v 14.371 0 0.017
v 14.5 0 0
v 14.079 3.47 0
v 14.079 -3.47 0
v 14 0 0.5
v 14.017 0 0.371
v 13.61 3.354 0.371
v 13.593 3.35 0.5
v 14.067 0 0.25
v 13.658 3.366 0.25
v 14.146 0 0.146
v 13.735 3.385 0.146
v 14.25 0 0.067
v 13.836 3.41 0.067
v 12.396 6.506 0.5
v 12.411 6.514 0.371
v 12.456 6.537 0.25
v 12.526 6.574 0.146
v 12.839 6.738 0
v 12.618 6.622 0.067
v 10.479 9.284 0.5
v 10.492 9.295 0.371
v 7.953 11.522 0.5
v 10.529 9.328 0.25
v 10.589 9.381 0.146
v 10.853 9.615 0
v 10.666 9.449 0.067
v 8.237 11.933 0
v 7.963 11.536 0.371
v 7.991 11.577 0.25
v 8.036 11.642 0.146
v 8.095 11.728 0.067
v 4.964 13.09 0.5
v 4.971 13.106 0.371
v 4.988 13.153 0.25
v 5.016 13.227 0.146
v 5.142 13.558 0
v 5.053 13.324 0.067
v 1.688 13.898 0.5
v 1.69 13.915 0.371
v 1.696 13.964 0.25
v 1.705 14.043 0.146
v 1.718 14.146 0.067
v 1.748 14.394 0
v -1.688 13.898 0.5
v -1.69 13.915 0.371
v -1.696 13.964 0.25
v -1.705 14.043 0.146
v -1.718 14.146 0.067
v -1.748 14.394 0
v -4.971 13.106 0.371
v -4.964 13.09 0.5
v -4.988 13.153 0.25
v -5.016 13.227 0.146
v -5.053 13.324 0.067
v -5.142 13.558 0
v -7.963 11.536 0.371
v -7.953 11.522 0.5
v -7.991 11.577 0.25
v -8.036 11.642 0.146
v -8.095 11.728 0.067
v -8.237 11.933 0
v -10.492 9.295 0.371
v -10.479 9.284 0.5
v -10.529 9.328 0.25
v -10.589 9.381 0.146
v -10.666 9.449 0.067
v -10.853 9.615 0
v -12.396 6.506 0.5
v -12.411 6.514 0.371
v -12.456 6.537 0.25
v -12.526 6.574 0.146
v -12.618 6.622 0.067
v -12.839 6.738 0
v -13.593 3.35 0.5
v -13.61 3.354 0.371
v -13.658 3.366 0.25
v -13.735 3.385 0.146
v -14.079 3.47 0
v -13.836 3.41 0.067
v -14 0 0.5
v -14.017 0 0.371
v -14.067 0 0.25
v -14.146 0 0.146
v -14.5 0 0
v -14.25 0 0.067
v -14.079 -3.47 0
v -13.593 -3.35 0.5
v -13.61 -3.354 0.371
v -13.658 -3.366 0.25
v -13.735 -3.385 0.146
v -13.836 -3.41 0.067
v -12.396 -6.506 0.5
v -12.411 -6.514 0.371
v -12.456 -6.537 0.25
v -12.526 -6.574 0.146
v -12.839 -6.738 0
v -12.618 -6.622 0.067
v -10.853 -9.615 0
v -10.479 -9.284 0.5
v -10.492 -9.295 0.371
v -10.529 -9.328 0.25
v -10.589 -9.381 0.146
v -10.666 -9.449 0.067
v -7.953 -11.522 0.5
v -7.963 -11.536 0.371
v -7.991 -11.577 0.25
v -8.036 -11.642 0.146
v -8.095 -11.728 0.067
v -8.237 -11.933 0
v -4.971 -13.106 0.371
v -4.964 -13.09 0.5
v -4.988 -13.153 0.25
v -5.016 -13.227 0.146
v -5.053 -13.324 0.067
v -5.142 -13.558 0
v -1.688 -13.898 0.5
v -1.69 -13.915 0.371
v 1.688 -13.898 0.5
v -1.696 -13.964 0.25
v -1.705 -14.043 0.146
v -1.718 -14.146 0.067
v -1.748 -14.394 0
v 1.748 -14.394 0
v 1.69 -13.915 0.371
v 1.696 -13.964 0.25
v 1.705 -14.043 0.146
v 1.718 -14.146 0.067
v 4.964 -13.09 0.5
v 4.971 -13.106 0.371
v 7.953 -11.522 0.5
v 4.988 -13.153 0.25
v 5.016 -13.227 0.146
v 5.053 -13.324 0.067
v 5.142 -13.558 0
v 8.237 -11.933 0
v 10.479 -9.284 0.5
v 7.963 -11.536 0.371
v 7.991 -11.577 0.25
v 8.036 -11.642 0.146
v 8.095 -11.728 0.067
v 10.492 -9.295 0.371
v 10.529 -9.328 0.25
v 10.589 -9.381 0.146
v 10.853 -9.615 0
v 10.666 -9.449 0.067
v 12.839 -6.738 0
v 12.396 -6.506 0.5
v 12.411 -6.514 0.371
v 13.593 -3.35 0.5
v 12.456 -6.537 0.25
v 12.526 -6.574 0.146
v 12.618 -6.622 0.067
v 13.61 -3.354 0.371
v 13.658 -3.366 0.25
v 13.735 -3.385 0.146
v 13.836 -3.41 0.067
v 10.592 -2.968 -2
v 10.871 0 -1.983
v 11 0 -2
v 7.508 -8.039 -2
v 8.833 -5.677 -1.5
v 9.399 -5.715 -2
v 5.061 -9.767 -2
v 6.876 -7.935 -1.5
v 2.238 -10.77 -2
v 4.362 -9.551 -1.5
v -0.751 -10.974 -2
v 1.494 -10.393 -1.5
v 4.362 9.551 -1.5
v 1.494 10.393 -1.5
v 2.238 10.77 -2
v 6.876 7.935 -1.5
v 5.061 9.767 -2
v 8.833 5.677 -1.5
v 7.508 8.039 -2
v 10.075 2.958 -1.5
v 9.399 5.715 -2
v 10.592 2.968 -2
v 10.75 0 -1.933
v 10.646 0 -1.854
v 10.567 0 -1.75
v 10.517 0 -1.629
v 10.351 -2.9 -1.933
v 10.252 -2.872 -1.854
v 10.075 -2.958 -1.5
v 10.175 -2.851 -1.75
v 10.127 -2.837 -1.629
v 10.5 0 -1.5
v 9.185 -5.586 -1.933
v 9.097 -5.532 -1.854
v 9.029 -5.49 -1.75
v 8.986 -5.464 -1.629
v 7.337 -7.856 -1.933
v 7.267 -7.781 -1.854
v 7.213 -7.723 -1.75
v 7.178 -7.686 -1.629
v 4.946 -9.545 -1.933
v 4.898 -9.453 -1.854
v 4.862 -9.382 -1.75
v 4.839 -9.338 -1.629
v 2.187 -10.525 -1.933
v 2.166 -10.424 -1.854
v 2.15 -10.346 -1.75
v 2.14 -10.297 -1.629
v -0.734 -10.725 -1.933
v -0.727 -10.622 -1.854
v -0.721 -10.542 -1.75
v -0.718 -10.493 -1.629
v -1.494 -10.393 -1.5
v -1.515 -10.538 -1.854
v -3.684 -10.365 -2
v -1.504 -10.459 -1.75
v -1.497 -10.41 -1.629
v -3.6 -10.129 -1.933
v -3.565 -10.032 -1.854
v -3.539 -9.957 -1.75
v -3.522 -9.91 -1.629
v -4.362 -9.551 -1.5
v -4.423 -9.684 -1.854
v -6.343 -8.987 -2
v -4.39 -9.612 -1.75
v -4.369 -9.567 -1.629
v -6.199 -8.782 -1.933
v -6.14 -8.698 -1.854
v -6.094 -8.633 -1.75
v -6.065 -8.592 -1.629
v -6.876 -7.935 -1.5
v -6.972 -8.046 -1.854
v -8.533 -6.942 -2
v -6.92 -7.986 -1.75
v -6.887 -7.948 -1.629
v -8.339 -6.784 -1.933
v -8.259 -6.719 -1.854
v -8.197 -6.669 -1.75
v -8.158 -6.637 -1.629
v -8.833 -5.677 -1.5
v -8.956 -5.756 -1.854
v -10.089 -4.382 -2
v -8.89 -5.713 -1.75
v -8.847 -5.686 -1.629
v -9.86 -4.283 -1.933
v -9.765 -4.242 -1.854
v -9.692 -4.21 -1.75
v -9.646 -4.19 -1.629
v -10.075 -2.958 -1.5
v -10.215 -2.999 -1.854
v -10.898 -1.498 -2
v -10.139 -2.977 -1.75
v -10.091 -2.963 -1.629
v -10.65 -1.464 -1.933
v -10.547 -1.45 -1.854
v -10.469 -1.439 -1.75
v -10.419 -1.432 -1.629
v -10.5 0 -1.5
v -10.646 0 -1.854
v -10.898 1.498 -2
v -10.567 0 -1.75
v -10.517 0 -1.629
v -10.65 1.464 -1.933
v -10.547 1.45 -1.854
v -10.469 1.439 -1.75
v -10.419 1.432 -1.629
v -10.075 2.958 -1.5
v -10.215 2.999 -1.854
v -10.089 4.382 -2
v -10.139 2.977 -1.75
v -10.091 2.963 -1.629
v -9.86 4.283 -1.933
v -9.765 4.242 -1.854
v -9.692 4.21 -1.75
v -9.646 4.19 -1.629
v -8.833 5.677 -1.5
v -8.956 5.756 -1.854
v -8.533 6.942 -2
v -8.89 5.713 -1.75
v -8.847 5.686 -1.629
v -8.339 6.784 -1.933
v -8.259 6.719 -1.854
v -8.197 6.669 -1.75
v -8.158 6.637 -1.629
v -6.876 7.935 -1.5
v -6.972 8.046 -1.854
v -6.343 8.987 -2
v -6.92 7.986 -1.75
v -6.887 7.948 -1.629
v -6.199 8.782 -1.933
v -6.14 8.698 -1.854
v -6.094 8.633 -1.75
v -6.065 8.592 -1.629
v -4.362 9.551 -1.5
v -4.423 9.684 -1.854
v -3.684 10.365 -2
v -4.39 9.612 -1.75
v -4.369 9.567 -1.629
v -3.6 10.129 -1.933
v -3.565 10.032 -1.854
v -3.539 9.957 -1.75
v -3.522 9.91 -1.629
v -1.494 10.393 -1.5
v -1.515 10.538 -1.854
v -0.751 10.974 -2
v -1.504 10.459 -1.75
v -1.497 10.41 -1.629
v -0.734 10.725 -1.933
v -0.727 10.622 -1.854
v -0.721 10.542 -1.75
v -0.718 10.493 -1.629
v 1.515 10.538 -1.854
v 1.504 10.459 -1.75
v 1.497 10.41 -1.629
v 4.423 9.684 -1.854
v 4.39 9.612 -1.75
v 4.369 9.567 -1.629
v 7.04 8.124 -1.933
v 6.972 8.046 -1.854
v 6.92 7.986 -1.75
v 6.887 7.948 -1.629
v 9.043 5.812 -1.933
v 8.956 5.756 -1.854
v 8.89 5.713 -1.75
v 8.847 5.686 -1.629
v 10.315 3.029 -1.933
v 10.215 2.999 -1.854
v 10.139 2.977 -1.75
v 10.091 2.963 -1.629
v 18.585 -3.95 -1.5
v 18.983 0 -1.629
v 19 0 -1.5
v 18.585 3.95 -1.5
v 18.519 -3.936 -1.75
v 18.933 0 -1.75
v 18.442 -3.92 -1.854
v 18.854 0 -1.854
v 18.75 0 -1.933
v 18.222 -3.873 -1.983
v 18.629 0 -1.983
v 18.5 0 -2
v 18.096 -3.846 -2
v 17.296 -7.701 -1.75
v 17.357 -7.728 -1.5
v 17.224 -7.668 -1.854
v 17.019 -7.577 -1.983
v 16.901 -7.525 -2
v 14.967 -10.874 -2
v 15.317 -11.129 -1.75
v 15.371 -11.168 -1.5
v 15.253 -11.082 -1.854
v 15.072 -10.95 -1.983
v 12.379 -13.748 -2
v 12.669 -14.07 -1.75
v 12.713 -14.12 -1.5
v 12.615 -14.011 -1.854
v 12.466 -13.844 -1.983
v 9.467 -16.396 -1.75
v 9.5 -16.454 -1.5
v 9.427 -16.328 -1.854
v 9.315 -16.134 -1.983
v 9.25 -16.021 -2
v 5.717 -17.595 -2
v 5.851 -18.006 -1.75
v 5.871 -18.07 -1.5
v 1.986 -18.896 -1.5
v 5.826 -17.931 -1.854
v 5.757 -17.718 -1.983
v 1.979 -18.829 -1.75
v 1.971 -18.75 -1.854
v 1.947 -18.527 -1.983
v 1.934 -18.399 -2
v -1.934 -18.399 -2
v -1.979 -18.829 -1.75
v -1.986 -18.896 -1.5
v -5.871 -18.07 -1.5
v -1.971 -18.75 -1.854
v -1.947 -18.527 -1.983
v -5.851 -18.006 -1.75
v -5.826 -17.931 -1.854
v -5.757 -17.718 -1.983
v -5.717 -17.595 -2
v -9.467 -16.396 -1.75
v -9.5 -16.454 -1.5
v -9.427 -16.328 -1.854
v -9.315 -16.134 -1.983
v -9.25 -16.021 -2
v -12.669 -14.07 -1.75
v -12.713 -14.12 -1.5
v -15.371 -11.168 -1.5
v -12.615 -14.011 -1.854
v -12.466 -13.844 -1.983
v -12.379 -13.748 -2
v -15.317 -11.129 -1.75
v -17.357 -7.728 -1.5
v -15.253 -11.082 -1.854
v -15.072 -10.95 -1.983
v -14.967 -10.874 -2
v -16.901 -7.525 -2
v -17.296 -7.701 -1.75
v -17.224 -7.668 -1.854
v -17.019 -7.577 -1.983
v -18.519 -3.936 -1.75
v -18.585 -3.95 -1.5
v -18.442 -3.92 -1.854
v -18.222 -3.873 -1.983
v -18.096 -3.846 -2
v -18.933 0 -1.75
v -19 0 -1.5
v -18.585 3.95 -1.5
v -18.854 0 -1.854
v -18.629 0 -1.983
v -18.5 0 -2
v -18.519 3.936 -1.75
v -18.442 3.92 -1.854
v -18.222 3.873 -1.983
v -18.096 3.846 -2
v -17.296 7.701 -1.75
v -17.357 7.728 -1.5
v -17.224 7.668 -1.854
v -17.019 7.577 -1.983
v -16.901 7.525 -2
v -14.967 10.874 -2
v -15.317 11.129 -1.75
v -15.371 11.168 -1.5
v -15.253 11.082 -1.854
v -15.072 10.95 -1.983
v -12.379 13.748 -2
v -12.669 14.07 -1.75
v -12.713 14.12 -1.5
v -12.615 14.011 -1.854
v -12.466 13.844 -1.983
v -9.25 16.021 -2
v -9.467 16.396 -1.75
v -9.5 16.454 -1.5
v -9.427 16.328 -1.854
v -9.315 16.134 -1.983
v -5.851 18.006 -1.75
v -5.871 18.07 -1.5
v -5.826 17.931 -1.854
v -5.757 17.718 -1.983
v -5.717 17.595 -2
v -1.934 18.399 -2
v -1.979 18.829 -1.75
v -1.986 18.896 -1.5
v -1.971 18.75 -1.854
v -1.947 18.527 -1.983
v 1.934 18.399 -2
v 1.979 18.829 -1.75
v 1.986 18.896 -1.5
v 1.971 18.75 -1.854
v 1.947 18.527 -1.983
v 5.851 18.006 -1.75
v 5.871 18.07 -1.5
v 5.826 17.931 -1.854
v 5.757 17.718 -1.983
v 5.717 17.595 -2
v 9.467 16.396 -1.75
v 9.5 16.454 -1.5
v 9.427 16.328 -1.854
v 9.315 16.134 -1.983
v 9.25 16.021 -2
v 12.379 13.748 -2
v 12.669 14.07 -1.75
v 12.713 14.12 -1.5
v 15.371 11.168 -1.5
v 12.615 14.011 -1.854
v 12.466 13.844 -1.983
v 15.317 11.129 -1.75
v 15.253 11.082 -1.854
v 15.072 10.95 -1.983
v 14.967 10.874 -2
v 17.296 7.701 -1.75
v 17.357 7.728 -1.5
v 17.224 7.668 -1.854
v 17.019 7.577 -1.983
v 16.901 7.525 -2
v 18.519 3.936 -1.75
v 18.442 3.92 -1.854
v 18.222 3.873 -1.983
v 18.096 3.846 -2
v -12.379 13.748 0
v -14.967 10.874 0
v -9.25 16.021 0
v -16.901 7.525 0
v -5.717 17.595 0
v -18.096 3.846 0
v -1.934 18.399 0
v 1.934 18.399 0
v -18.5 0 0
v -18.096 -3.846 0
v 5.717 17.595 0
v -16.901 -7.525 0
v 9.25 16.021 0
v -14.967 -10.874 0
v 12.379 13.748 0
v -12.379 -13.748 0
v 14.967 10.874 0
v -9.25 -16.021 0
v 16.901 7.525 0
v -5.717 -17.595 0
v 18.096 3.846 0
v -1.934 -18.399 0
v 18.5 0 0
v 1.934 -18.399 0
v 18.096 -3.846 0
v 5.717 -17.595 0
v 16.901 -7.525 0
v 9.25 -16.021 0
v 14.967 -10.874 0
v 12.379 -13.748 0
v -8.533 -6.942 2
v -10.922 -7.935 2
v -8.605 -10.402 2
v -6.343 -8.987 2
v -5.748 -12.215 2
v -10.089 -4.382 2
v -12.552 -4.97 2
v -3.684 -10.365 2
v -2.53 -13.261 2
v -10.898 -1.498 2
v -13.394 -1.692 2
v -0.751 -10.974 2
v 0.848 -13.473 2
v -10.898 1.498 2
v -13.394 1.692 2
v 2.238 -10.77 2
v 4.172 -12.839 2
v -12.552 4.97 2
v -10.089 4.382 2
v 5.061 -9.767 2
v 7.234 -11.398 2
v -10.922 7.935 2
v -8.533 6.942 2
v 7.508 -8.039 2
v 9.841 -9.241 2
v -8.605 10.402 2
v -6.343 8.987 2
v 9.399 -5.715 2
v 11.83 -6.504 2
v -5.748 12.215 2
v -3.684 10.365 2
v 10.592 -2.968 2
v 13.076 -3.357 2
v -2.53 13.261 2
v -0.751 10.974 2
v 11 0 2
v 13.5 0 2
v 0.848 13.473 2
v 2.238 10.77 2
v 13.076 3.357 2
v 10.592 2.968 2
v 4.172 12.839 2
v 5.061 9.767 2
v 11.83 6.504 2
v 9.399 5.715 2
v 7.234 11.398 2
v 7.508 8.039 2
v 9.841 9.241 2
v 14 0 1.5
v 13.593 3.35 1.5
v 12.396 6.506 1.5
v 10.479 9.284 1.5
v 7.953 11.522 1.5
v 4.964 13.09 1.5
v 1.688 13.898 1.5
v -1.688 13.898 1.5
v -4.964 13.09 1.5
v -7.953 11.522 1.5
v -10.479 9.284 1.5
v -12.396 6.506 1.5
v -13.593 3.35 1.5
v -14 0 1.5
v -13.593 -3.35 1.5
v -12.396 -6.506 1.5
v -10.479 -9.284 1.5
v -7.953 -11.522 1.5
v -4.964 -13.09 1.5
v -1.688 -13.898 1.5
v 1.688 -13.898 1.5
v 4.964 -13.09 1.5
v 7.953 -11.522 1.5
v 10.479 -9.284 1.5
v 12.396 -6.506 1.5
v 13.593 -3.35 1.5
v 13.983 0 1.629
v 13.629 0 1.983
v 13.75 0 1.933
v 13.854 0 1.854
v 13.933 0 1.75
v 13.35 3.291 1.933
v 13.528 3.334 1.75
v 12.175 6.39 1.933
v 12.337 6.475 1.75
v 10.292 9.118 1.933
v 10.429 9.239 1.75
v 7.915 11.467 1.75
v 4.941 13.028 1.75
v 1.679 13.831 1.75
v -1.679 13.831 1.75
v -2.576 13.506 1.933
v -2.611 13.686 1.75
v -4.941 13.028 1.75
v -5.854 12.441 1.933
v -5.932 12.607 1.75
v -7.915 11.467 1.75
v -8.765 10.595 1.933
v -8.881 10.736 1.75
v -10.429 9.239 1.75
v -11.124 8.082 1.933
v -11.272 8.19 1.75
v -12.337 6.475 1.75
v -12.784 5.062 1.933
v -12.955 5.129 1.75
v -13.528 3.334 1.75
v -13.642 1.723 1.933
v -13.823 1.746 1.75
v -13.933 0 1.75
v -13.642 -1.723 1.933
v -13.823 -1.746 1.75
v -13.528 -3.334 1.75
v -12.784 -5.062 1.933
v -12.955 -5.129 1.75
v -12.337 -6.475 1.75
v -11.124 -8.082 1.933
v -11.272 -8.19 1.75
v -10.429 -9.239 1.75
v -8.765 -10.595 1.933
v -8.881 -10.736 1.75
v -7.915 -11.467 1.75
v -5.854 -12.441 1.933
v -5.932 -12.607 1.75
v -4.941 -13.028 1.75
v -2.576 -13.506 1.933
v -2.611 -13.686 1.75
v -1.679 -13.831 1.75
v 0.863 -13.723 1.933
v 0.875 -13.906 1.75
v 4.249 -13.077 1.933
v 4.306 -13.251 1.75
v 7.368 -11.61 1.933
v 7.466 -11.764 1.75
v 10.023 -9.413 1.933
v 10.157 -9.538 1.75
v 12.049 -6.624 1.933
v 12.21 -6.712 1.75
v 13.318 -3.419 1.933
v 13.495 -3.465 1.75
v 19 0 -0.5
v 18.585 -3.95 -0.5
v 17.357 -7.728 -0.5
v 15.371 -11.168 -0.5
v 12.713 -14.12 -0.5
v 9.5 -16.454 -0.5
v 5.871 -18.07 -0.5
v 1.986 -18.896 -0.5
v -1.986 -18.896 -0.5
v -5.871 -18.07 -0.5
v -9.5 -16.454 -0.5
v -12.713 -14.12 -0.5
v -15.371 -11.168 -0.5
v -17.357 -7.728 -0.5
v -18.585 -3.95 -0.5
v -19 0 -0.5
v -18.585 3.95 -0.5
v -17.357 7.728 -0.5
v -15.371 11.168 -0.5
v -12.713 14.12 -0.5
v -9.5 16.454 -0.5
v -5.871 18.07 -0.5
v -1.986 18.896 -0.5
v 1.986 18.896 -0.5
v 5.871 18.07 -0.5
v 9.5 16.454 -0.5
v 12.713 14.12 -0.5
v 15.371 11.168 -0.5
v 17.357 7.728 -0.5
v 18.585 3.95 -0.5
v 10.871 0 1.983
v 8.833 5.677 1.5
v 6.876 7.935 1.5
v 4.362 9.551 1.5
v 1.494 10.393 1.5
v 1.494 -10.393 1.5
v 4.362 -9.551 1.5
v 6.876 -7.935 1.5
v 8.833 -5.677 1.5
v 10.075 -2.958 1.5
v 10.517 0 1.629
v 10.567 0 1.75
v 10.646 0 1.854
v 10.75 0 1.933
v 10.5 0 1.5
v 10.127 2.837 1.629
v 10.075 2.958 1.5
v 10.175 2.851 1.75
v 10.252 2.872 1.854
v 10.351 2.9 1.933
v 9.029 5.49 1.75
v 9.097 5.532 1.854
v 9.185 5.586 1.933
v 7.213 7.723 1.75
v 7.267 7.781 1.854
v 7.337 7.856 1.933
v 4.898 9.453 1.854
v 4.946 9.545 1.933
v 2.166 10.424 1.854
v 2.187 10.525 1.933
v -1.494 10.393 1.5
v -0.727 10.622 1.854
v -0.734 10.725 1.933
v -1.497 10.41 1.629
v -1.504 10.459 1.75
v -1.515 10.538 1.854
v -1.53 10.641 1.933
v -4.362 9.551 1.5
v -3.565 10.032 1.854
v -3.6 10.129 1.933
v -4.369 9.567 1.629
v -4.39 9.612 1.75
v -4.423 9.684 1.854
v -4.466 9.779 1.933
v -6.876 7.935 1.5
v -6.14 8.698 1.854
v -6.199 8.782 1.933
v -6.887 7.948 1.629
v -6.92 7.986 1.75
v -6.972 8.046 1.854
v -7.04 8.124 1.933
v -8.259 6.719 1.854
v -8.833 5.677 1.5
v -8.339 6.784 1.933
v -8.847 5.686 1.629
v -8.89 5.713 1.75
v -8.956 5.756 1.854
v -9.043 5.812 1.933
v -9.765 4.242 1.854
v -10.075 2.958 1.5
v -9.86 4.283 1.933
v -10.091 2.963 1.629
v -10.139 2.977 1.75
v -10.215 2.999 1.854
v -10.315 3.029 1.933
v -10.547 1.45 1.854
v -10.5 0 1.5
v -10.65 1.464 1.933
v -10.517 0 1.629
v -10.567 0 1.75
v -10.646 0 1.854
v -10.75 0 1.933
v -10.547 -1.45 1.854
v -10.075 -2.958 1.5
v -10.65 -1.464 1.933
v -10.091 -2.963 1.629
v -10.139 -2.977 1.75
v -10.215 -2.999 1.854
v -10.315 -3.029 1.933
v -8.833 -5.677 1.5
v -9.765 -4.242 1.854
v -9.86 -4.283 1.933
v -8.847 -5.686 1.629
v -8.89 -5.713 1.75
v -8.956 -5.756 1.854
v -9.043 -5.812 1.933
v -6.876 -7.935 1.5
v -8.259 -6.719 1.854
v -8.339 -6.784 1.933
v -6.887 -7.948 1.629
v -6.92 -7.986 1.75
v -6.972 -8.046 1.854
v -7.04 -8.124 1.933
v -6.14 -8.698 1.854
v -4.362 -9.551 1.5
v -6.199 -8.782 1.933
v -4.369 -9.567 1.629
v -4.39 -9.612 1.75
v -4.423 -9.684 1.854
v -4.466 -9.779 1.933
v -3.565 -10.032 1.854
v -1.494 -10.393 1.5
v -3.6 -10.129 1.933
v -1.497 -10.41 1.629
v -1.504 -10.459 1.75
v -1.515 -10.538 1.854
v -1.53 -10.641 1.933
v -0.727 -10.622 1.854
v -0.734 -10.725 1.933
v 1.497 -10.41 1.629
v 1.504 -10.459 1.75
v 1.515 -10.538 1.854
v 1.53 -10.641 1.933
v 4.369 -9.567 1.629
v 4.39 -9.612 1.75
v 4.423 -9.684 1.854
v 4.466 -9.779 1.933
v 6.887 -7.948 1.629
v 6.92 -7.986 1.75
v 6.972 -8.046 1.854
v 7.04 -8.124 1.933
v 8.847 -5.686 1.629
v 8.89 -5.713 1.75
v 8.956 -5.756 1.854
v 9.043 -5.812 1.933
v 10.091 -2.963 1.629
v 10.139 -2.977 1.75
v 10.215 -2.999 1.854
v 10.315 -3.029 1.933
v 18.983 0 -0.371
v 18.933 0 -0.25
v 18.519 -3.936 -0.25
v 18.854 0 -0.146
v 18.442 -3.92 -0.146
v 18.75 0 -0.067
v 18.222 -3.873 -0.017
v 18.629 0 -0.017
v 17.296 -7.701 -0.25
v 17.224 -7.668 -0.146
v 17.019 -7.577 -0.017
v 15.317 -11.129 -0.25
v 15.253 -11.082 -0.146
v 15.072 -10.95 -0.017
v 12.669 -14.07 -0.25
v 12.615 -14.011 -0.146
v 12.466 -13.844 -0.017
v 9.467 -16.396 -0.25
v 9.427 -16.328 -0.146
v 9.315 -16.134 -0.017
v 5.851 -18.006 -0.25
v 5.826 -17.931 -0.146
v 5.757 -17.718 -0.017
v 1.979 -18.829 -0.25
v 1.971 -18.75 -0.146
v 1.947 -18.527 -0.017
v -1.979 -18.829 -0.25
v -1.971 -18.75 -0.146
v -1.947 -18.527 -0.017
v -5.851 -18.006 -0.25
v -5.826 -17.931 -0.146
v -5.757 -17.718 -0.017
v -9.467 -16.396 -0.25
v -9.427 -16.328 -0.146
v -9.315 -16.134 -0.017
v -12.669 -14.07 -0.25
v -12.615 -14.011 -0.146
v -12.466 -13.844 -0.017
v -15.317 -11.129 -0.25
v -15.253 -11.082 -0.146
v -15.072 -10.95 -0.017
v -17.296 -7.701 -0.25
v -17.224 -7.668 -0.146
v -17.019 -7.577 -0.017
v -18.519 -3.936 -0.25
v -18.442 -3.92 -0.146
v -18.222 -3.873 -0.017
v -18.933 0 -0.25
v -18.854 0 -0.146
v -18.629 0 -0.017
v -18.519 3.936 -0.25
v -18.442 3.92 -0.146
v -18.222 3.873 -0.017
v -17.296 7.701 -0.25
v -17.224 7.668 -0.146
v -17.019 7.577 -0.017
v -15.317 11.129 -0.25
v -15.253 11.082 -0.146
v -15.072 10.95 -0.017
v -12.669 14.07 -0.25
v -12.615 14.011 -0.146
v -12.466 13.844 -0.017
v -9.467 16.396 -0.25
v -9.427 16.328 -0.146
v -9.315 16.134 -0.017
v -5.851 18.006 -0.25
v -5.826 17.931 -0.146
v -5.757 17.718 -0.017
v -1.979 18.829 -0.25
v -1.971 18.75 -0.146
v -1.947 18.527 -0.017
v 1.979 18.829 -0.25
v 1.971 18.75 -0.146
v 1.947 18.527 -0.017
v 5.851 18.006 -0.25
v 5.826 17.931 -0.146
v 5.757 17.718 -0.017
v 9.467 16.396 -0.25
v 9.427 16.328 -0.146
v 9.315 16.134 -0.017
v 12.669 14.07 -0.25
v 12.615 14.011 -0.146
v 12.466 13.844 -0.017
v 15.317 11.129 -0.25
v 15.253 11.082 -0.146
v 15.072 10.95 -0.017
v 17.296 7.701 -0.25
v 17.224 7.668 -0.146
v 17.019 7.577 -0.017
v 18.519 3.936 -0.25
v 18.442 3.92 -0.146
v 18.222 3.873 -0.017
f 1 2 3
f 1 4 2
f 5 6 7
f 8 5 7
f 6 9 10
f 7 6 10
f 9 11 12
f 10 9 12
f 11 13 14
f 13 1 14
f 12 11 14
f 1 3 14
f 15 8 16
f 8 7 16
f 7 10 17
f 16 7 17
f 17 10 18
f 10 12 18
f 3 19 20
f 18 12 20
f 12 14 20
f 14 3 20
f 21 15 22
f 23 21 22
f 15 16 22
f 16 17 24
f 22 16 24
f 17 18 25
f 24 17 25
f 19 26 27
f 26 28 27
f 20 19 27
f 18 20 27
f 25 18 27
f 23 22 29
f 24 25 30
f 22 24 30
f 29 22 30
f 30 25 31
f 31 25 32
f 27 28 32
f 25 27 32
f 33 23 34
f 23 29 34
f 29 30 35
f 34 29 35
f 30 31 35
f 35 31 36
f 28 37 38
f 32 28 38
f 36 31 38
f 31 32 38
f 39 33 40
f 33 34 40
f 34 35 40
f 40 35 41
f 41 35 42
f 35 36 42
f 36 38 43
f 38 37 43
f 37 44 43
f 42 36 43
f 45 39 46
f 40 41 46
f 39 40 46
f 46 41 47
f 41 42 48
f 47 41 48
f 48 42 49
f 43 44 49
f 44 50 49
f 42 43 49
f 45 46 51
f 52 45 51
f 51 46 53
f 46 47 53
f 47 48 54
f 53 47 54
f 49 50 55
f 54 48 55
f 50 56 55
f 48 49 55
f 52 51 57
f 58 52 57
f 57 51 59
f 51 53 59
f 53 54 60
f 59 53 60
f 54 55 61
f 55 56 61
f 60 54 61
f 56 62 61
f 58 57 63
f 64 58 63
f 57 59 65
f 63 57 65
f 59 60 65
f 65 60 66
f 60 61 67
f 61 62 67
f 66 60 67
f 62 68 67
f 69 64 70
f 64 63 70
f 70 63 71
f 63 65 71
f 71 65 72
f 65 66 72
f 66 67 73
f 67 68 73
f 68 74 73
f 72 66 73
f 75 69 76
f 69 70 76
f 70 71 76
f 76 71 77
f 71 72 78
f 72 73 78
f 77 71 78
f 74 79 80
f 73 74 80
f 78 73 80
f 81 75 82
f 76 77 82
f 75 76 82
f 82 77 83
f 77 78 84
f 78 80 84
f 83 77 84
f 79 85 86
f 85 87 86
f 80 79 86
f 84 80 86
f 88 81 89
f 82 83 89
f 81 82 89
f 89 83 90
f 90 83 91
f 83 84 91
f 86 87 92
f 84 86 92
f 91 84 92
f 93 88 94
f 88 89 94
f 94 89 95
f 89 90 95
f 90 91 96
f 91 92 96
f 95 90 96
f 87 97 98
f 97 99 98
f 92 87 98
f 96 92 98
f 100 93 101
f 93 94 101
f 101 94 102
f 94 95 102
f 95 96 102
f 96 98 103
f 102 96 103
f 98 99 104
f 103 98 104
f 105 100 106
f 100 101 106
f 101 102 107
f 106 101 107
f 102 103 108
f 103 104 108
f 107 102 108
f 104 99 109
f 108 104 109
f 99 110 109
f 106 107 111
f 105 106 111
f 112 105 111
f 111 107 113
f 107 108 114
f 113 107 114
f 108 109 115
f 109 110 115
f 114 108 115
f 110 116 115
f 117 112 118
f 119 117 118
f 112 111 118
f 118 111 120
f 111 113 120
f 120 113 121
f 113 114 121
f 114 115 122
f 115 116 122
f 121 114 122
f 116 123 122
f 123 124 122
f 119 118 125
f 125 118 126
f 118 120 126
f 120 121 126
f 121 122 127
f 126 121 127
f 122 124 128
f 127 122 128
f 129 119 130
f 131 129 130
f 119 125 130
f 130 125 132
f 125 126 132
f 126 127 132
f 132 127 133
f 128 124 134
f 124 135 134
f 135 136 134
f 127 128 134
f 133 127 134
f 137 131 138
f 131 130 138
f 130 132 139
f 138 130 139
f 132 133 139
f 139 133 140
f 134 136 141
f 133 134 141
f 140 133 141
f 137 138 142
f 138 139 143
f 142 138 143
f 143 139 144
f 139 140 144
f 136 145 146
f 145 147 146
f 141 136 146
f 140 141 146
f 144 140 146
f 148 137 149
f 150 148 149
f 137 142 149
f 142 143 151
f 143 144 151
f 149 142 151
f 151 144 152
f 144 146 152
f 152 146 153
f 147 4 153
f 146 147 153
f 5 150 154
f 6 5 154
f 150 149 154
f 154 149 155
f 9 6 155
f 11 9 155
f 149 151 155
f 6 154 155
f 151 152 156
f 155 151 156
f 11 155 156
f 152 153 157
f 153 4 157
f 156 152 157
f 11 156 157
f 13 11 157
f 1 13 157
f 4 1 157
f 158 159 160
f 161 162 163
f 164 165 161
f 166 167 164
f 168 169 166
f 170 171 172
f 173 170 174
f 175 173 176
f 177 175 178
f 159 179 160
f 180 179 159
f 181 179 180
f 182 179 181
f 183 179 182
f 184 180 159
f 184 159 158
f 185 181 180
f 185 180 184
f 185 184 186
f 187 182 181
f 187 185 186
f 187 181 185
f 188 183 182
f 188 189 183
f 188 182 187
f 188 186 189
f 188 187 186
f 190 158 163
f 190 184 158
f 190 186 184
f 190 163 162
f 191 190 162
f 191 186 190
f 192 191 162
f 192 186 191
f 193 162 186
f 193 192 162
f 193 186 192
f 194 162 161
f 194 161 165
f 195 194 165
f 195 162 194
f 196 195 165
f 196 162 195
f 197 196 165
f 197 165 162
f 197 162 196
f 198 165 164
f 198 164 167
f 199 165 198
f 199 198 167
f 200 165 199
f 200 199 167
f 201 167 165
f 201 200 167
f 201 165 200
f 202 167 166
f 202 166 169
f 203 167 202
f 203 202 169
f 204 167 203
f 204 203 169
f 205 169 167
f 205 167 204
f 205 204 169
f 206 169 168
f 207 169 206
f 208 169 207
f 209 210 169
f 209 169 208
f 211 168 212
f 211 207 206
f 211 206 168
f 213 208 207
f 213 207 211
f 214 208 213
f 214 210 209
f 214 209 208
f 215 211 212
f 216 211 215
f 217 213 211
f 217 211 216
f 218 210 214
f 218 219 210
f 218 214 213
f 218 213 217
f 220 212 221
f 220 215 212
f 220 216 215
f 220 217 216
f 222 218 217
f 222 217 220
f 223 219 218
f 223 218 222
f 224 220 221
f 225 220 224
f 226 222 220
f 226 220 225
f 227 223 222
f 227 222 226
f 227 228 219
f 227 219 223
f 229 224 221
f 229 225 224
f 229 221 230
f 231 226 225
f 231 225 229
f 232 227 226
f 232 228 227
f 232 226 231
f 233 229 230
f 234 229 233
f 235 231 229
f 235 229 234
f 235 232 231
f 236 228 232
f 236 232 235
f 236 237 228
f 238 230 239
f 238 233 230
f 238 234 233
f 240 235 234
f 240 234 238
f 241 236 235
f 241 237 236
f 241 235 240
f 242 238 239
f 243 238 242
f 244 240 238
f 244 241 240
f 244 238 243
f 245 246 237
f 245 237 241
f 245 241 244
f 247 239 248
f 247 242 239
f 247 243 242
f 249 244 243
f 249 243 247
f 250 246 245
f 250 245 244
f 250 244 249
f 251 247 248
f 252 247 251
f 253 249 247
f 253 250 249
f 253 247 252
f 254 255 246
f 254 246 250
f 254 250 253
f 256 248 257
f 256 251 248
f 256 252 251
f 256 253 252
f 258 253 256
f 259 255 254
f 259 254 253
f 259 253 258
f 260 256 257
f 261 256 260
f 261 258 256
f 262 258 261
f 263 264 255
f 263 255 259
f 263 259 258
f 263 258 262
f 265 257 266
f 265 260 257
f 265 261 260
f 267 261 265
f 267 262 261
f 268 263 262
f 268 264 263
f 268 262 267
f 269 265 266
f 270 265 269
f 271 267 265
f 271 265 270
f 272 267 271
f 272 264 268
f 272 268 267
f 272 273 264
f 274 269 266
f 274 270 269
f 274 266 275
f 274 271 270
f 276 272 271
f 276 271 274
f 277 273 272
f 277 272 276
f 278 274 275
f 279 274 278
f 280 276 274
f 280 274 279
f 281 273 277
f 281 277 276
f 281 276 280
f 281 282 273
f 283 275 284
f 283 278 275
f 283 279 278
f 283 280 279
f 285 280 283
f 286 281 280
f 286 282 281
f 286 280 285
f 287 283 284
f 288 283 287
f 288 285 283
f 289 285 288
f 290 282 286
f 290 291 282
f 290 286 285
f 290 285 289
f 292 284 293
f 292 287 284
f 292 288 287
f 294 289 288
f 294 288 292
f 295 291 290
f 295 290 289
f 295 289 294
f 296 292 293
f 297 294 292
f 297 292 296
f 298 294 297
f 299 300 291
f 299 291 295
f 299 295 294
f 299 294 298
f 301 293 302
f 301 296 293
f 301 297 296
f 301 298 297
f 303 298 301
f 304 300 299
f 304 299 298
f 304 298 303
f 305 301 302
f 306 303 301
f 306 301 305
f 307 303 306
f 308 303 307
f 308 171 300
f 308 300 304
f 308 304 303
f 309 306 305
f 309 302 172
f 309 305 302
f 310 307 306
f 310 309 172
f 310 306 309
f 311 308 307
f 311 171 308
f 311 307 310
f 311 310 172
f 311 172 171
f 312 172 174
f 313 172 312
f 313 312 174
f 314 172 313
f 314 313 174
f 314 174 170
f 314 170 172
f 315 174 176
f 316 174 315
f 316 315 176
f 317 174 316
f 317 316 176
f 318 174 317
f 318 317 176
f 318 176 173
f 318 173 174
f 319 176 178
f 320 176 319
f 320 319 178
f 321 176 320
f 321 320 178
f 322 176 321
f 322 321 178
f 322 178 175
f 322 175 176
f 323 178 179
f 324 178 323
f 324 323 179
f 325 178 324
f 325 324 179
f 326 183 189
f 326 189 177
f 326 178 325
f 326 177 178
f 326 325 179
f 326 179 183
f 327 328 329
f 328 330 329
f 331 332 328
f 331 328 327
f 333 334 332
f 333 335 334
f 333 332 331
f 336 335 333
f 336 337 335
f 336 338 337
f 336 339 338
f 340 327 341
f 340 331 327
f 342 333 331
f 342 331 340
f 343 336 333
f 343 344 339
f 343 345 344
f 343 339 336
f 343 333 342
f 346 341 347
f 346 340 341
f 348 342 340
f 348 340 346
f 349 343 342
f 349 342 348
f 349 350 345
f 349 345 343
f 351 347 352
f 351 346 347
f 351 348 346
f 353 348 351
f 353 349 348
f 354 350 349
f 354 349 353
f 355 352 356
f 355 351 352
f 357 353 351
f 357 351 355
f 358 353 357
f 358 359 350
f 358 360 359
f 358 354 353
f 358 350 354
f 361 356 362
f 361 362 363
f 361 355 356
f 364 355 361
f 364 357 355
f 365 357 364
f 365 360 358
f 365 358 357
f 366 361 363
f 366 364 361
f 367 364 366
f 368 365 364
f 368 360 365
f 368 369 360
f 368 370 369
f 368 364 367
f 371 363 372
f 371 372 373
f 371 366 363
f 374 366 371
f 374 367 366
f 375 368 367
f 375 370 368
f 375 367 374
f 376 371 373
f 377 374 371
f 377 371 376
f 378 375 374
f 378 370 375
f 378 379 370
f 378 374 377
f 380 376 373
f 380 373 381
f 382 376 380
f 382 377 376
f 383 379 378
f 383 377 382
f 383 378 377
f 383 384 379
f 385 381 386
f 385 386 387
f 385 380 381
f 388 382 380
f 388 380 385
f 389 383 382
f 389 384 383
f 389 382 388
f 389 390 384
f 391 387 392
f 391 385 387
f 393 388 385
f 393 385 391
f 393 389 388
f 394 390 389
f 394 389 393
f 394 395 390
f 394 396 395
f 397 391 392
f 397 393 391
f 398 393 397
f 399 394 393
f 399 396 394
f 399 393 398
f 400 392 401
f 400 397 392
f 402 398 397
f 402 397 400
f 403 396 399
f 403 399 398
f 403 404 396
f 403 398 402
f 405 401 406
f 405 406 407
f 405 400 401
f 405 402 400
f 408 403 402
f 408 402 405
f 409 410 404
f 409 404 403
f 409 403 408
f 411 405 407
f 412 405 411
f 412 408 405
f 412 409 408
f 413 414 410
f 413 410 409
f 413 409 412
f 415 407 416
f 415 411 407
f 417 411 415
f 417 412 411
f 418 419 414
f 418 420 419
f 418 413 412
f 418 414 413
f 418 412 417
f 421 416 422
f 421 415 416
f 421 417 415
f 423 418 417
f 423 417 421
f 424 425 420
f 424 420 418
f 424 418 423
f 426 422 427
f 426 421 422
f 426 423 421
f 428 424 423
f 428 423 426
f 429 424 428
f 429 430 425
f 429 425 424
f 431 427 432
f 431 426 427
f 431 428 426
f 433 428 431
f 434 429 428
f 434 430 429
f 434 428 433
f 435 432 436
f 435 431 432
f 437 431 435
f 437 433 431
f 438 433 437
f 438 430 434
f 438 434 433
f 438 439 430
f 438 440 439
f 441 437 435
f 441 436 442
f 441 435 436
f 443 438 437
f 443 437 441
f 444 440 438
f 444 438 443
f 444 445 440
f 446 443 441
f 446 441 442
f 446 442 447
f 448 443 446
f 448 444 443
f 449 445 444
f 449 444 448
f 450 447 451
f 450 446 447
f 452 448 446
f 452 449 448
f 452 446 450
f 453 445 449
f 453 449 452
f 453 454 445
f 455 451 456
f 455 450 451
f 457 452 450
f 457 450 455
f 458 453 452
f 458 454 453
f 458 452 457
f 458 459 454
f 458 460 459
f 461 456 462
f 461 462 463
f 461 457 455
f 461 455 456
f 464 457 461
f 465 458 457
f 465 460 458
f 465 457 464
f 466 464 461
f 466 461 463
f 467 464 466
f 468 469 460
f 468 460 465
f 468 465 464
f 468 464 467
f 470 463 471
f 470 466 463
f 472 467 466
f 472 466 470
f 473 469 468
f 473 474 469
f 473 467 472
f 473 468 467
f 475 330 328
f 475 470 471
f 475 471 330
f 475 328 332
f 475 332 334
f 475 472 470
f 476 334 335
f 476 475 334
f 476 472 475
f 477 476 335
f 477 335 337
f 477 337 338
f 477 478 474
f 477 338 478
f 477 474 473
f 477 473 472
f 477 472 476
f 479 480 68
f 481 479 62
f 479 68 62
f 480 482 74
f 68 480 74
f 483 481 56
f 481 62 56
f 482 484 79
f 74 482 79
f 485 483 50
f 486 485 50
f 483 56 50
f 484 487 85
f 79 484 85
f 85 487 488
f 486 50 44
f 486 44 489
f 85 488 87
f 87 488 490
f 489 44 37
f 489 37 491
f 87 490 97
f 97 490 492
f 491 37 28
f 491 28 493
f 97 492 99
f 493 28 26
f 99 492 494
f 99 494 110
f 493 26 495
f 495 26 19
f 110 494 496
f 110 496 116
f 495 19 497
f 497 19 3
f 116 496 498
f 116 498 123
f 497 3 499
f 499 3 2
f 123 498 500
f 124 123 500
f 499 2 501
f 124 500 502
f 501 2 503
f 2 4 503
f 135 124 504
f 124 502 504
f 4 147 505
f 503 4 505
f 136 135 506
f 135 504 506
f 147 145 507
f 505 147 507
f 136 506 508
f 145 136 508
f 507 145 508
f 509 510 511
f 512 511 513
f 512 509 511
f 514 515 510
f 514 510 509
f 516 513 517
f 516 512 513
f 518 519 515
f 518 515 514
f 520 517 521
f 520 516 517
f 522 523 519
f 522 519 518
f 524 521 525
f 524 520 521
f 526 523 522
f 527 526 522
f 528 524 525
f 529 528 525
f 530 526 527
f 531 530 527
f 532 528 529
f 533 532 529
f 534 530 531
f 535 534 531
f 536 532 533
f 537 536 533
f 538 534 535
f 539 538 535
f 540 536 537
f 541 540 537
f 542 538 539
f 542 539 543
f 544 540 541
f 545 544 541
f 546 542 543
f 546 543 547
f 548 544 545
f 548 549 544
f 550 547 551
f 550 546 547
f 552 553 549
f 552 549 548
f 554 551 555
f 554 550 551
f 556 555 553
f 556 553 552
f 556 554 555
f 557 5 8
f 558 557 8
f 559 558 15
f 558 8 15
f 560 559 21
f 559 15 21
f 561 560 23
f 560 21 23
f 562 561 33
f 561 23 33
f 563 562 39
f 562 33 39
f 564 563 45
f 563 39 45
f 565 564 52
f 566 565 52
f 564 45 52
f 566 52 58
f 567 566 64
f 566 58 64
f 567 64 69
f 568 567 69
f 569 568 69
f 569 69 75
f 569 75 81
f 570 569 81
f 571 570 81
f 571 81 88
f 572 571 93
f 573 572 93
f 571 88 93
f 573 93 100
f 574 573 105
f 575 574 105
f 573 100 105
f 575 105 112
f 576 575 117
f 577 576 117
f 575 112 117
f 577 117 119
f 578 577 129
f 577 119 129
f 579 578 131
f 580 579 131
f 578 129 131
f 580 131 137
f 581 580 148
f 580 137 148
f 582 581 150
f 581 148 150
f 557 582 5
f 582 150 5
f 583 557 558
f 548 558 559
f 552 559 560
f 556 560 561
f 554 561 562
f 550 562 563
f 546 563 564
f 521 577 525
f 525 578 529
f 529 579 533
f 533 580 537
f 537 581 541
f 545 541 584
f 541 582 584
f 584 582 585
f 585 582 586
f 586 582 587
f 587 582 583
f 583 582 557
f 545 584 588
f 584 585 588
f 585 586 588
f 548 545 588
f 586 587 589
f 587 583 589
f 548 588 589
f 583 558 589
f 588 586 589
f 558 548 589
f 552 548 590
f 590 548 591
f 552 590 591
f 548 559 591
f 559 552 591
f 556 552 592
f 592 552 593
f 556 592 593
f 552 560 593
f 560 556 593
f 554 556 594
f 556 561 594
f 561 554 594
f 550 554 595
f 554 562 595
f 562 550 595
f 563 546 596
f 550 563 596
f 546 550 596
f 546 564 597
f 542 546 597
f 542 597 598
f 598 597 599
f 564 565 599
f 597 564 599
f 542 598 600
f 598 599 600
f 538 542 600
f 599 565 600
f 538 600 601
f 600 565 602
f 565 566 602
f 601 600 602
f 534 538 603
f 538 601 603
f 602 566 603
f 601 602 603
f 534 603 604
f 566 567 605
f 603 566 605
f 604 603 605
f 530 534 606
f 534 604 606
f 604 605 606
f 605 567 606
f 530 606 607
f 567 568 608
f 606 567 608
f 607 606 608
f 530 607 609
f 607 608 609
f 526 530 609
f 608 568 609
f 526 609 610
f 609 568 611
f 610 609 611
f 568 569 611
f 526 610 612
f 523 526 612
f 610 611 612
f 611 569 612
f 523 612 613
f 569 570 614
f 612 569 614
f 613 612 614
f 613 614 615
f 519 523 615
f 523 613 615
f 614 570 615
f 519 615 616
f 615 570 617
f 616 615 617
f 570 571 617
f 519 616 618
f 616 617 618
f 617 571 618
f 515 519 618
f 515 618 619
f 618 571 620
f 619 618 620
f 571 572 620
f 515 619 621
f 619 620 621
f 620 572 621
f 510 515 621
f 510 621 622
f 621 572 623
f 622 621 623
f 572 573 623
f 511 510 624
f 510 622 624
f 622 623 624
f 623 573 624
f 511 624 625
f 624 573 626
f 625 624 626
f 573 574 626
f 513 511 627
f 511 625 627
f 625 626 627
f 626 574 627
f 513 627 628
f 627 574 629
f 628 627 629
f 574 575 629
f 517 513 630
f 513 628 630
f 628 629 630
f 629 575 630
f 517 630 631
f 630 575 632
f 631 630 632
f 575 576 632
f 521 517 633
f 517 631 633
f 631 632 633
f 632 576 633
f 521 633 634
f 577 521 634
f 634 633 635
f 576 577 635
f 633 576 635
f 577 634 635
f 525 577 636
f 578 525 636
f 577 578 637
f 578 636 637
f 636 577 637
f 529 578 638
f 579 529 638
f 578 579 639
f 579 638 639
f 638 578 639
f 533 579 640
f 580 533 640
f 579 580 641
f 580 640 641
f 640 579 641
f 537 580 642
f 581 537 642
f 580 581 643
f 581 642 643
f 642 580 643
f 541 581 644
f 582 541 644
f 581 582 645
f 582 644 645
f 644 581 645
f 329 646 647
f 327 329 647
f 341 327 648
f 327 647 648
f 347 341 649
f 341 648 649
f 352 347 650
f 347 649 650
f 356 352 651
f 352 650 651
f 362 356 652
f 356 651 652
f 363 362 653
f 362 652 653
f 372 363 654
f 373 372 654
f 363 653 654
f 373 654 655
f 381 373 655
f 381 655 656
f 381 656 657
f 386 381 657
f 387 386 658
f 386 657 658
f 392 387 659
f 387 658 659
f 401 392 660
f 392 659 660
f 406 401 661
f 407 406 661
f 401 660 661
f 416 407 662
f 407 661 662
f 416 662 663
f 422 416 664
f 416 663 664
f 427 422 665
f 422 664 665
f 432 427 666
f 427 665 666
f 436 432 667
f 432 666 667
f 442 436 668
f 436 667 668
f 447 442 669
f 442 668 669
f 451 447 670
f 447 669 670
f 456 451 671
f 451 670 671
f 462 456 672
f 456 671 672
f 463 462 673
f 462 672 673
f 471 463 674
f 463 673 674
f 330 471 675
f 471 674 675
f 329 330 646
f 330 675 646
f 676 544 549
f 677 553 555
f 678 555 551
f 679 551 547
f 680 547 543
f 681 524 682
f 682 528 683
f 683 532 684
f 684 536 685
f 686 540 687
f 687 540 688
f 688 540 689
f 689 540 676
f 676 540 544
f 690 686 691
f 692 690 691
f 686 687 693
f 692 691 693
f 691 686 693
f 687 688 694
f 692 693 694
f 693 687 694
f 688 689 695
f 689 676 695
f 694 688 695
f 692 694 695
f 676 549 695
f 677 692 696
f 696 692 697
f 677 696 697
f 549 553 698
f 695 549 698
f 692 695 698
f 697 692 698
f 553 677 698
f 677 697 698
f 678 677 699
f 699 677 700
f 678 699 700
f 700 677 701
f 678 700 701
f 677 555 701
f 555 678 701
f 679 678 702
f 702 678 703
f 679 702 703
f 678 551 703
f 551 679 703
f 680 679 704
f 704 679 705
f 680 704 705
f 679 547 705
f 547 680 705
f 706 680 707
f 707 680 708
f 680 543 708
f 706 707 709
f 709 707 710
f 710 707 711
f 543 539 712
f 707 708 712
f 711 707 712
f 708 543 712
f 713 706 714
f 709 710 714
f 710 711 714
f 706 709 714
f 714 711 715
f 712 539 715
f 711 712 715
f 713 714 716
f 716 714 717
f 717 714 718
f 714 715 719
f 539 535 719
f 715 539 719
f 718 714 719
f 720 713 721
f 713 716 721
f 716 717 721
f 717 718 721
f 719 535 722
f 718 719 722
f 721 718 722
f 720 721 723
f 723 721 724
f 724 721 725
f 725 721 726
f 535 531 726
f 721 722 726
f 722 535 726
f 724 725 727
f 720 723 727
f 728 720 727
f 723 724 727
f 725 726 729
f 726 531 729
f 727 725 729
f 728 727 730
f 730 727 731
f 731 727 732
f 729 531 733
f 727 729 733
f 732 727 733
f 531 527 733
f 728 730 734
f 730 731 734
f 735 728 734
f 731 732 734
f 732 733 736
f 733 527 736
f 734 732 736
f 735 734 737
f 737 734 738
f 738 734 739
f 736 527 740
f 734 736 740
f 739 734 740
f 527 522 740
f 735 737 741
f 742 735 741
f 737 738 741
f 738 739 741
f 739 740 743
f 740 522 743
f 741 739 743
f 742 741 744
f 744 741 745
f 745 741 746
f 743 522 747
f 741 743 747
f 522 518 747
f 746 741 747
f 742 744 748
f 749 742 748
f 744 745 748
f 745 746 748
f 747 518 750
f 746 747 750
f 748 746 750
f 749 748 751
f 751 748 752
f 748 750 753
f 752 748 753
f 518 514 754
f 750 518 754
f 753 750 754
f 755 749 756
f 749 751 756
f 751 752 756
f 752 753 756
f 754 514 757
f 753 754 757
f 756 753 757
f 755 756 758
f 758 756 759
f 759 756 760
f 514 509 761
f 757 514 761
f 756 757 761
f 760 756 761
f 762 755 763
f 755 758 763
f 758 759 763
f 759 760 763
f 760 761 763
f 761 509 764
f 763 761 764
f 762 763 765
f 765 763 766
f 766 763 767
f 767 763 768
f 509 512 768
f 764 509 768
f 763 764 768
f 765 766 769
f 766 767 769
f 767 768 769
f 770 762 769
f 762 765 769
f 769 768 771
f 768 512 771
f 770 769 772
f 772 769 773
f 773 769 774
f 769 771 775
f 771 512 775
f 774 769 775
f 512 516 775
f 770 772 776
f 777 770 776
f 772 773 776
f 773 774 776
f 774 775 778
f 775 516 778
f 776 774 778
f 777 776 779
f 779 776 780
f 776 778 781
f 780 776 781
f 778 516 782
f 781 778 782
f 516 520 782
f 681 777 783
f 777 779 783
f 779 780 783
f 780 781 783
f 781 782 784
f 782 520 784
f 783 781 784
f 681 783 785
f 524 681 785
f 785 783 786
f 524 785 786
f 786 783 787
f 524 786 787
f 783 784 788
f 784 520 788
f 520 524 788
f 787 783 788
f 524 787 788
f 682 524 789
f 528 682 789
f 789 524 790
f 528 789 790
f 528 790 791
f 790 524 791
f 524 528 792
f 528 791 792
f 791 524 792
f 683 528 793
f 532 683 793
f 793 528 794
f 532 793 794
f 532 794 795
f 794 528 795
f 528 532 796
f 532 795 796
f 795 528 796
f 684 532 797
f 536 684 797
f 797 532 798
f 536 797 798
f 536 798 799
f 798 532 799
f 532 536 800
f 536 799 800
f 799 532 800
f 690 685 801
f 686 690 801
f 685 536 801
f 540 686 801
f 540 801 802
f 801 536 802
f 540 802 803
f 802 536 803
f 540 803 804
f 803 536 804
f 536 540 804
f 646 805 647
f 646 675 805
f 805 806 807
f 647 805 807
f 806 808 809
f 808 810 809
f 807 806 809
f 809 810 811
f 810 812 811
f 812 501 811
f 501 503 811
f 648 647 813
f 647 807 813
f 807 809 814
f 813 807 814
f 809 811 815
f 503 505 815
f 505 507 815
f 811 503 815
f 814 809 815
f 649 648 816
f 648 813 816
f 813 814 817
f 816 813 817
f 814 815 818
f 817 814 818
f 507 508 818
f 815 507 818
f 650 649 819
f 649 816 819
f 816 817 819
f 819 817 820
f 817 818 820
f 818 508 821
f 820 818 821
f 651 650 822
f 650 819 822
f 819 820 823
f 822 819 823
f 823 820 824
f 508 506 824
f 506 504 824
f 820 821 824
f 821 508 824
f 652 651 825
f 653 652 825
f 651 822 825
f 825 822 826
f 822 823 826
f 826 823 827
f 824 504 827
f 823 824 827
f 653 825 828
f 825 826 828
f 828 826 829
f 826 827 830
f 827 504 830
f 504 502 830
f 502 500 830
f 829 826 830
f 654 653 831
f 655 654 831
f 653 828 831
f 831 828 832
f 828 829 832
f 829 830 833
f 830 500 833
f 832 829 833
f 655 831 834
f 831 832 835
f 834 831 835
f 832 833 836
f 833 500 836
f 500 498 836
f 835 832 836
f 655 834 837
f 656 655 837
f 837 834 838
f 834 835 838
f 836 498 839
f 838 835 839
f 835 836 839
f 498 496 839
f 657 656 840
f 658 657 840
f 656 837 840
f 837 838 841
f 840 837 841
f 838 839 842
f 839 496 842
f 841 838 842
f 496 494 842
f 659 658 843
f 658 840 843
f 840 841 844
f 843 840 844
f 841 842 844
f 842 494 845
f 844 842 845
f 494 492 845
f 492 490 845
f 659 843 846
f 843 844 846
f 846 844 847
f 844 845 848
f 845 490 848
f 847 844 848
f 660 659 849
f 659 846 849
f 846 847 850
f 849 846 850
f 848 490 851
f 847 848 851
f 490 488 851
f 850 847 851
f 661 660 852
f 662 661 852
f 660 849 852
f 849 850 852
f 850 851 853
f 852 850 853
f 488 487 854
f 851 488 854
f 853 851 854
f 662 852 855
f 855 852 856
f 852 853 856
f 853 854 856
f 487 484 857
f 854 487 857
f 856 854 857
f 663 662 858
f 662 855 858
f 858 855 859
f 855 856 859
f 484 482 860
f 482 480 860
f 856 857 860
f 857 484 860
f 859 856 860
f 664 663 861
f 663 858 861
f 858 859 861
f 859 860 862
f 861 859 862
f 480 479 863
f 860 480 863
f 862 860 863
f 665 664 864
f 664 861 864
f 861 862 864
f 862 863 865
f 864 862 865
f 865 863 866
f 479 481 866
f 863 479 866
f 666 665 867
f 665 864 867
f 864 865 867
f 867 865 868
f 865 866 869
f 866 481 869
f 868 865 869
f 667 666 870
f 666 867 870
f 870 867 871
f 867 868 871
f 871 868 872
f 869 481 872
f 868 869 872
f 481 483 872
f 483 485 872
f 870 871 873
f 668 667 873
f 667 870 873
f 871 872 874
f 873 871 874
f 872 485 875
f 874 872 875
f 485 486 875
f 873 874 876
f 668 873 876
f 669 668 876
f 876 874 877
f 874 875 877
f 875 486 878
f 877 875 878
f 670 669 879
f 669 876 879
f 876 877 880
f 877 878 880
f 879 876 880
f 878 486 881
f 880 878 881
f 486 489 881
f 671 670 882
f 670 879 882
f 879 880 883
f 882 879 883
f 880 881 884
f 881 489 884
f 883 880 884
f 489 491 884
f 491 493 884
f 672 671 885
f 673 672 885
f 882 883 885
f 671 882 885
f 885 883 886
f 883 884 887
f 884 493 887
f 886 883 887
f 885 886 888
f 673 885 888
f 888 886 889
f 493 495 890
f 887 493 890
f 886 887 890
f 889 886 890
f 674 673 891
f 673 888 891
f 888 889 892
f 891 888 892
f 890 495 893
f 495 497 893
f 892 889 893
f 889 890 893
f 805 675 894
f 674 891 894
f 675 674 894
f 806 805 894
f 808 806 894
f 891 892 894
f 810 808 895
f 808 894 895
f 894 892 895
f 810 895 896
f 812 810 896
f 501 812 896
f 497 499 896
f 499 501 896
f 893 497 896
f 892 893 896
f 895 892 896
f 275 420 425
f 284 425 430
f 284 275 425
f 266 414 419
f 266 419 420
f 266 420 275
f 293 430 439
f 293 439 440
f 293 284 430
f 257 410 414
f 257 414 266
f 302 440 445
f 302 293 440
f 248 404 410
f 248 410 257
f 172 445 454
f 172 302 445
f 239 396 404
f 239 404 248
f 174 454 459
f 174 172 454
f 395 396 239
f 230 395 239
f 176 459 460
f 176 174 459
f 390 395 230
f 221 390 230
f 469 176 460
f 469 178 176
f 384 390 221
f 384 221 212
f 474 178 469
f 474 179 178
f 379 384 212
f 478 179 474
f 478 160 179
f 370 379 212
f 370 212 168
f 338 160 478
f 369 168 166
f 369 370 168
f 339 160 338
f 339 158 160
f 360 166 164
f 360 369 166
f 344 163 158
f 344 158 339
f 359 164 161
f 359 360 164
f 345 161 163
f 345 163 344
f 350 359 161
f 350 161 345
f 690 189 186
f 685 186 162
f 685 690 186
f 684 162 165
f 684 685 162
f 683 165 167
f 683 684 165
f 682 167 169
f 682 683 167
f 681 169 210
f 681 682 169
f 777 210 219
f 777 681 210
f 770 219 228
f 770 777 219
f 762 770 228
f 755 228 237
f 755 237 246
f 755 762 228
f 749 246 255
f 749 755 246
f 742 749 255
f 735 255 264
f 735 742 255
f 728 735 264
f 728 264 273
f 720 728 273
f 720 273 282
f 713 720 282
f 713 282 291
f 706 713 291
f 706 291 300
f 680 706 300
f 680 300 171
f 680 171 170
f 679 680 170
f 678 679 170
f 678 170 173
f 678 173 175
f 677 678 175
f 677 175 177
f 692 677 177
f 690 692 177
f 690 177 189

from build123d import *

# Parameters (mm, degrees)
F0_R     = 14
F0_R_2   = 10.5
F1_DEPTH = 2
F2_R     = 19
F2_R_2   = 10.5
F3_DEPTH = 2
F4_R     = 0.5


with BuildPart() as f1:
    # F0 (on Top) → F1 (new body)
    with BuildSketch(Plane.XY):
        Circle(F0_R)
        Circle(F0_R_2, mode=Mode.SUBTRACT)
    extrude(amount=F1_DEPTH)

    # F2 (on face) → F3 (join)
    with BuildSketch(Plane(origin=(0, 0, 0), x_dir=(1, 0, 0), z_dir=(0, 0, -1))):
        Circle(F2_R)
        Circle(F2_R_2, mode=Mode.SUBTRACT)
    extrude(amount=F3_DEPTH)

    # F4
    f4_edges = [f1.edges().sort_by_distance(p)[0] for p in [
        (-10.5, 0, 2),
        (-14, 0, 2),
        (-19, 0, 0),
        (-14, 0, 0),
        (-19, 0, -2),
        (-10.5, 0, -2),
    ]]
    fillet(f4_edges, radius=F4_R)


solid = f1.part
